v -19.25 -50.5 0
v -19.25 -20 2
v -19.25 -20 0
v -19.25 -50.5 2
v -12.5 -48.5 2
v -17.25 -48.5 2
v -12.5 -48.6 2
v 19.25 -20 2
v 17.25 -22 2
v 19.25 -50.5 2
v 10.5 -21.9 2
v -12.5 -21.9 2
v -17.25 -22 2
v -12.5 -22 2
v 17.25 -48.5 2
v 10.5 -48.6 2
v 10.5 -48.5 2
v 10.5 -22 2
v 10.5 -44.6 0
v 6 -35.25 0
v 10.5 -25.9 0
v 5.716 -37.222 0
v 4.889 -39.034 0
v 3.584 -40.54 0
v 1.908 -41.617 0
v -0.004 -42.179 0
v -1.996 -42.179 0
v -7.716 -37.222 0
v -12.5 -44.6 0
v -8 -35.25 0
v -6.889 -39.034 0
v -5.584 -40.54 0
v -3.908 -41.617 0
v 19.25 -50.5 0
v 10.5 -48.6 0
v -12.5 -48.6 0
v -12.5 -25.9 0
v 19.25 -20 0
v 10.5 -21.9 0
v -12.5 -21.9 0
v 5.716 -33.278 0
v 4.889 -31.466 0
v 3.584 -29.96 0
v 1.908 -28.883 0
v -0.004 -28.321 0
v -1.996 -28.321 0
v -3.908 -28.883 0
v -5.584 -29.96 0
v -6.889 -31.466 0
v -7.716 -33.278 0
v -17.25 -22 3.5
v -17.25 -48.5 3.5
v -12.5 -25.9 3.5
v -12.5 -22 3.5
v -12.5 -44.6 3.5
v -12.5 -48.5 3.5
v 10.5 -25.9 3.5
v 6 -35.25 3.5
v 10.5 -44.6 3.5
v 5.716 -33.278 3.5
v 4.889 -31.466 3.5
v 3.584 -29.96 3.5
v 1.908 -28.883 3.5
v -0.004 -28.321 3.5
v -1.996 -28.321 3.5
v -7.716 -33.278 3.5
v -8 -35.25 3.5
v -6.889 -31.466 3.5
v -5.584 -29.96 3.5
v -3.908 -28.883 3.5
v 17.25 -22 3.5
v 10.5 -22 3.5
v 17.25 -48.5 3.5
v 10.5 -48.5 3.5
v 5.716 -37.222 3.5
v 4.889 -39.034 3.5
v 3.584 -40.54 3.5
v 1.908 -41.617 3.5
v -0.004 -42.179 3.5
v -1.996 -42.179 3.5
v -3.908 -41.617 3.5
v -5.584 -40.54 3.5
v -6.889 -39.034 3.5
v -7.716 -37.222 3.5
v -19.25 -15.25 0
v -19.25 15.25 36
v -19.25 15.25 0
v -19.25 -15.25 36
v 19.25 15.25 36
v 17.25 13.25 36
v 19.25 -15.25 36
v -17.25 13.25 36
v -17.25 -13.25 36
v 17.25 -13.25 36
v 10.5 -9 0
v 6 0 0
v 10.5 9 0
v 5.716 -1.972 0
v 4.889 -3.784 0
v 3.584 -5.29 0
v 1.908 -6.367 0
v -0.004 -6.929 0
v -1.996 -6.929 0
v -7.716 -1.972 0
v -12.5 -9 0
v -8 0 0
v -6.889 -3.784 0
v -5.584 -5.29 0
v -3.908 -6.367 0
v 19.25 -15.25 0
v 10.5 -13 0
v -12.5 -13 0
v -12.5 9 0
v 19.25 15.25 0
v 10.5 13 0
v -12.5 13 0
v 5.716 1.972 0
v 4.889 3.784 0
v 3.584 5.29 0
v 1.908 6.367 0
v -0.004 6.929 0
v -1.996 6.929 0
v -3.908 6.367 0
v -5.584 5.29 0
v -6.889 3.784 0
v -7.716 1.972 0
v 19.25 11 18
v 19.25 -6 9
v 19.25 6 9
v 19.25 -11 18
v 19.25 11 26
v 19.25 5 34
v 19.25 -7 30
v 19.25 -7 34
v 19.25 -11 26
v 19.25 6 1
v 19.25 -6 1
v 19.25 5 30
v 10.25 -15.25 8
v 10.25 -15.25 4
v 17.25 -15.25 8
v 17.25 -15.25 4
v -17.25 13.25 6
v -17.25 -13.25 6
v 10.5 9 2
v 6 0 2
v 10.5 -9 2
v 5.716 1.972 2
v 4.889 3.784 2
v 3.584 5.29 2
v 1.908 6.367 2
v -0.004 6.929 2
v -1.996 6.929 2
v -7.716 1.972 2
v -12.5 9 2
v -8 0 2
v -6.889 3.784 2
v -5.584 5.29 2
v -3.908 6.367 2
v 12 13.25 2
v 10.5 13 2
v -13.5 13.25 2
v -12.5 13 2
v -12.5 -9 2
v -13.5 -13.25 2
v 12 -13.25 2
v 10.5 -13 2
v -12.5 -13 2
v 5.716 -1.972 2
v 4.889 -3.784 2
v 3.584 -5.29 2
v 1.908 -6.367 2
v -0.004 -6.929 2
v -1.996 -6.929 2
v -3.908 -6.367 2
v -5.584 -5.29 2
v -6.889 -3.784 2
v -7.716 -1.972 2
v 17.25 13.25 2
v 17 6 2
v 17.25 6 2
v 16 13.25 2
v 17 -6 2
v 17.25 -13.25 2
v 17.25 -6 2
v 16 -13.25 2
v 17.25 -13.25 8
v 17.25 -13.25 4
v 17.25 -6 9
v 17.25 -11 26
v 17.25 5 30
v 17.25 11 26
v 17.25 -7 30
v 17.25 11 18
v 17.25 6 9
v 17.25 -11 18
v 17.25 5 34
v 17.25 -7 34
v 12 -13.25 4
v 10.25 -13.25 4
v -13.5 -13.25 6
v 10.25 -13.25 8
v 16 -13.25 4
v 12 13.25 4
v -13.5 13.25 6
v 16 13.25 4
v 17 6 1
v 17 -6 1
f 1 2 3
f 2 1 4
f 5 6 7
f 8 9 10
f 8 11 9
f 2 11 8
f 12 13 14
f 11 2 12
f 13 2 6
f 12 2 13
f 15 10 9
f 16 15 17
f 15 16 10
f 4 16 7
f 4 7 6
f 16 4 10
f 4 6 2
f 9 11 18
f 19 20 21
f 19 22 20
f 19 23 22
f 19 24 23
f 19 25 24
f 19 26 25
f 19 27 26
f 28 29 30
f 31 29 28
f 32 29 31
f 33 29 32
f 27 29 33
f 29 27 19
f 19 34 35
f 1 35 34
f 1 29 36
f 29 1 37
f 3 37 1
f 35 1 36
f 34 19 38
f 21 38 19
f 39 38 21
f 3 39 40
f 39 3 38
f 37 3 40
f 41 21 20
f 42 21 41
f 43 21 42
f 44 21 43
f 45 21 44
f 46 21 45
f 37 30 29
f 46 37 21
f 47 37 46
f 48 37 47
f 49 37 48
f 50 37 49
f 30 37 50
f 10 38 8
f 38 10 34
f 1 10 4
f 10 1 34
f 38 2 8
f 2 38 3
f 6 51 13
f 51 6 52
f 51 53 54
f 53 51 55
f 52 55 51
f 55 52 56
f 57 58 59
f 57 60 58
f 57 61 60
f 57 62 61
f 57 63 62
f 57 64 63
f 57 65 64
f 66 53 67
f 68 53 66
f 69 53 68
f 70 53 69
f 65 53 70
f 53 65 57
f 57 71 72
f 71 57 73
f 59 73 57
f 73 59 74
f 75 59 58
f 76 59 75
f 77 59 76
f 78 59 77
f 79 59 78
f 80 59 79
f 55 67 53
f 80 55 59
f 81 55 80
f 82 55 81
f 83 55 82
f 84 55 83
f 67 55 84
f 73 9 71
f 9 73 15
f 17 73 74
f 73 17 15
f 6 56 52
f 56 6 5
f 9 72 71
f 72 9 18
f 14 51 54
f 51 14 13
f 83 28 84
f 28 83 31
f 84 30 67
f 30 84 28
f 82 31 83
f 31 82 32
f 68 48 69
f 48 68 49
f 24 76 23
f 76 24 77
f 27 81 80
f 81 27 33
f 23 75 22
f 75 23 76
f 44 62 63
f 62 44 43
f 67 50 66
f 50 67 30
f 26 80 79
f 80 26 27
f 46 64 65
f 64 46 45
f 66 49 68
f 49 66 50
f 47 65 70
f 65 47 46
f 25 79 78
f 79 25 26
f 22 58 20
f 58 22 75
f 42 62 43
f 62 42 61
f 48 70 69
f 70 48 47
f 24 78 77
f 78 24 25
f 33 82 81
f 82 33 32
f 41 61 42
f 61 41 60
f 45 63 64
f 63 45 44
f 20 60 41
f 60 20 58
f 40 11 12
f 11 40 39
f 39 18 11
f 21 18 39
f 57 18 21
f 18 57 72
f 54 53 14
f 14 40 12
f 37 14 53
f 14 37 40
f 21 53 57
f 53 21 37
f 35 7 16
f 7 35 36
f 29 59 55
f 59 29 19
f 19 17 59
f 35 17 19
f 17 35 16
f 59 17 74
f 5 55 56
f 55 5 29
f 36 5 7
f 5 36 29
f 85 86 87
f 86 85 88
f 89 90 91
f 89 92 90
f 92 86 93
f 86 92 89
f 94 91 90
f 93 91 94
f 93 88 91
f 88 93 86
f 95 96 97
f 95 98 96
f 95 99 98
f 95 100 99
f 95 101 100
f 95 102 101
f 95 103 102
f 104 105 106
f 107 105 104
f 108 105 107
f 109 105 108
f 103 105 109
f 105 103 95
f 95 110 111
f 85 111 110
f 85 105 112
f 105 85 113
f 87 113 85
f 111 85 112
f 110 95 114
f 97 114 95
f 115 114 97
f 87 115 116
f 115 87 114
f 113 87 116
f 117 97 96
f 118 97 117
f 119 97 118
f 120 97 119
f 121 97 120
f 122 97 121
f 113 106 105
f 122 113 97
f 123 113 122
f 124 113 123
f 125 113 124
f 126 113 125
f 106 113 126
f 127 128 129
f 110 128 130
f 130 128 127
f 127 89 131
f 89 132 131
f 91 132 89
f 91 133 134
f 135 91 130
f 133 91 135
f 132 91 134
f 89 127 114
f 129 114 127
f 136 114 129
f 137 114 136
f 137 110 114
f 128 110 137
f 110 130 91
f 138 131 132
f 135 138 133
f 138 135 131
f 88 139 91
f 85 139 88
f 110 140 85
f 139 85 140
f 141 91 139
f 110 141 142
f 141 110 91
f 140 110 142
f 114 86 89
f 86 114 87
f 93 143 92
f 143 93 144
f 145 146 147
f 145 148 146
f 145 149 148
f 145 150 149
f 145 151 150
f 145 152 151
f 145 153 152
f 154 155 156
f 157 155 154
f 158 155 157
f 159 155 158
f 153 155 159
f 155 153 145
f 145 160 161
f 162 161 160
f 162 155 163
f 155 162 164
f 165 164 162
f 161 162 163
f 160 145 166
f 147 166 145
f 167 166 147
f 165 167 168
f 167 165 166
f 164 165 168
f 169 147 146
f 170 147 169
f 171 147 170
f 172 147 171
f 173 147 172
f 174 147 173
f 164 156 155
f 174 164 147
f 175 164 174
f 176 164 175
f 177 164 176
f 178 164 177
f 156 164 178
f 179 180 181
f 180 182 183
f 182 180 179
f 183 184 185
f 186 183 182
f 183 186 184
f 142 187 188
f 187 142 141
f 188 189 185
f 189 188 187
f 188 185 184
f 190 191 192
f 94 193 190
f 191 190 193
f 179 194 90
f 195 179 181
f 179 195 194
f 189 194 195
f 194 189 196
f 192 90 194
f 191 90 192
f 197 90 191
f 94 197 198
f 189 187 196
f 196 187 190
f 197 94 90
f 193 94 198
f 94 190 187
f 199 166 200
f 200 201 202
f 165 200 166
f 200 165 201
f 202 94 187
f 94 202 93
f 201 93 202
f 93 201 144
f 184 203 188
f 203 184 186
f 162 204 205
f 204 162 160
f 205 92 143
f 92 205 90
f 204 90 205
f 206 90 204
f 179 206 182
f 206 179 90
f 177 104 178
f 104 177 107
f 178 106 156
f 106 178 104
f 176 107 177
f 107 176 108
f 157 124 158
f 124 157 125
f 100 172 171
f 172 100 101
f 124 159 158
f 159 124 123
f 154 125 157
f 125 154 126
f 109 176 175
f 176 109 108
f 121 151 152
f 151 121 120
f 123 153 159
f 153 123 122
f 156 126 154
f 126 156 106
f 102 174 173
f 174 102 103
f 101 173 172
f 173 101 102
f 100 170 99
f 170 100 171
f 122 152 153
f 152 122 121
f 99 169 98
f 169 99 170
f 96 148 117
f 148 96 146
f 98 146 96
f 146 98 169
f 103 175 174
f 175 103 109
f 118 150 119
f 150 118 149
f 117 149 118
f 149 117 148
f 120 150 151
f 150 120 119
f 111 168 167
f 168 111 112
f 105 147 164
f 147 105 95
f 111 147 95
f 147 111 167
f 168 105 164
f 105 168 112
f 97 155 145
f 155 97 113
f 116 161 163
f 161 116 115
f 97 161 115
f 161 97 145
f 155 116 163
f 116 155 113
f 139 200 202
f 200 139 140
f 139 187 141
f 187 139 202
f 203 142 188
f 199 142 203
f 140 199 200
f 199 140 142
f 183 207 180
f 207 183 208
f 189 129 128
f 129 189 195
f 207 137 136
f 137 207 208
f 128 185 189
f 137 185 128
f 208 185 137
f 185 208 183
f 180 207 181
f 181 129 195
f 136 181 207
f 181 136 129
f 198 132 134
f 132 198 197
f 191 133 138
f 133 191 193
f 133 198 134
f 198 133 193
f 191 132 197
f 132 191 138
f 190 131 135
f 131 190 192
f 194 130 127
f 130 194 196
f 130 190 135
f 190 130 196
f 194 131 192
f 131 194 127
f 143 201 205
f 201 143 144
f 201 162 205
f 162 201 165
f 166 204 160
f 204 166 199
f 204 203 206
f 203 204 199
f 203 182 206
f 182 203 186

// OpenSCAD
//
// WeMOS D1 Mini Stack Enclosure Script
//
// I wrote this script to generate a suitable 3-d printed enclosure for a WeMOS "stack" of shields.
// Since there are a variety of connectors, sizes and arrangements, I decided to let the customizer
// allow for various positionings of each shields port.
//
// To use, you will need to assemble your device and measure the total height of the case, and the
// height offsets for any shields that require an opening in the case.
//
// For instance, I have a WeMOS D1 Mini with a battery shield and then an SD Card shield on top of 
// that.  All have stackable headers, that have had their pins trimmed to make the stack as short
// as possible.  The resulting measurements of the stack yield the default values of this script.
//

/* [Height] */

// Final height of the stack walls.
height = 36.0;

/* [Shield Ports] */

// Distance from the bottom to the bottom of the usb connector opening (0.0 to omit)
usb_height = 1.0;
// Distance from the bottom to the bottom of the microsd shield opening (0.0 to omit)
microsd_height = 30;
// Distance from the bottom to the bottom of the battery shield connector opening (0.0 to omit)
battery_height = 18.0;
// Distance from the bottom to the bottom of the relay shield connector terminal opening (0.0 to omit)
relay_height = 0.0;

// ---------------------------------------------------------------------------------------------------------
// do not need to modify anything below here
// ---------------------------------------------------------------------------------------------------------
/* [Hidden] */

thickness = 2.0;
fudge = 0.1;

width = 38.5;
depth = 30.50;
 
cavity_width = width - (2 * thickness);
cavity_depth = depth - (2 * thickness);
cavity_height = height - thickness + fudge;

hole_diameter = 7.0;

slit_width = 4.0;
slit_height = 23.0;

// lid
rotate([0, 0, 180])
difference() {
    union () {
        translate([-(width / 2.0), 20, 0.0]) cube([width, depth, 2.0]);
        translate([-(cavity_width / 2.0), 22, 2.0]) cube([cavity_width, cavity_depth, 1.5]);            
    }
    translate([1, 22 + (cavity_depth / 2), 2.5]) cylinder(h = 5 + fudge, r1 = hole_diameter, r2 =hole_diameter, center = true);
    rotate([0, 0, 90]) translate([21.9, -12.5, 0]) cube([slit_width, slit_height, 10]);
    rotate([0, 0, 90]) translate([44.6, -12.5, 0]) cube([slit_width, slit_height, 10]);
}

// base
rotate([0, 0, 180])
union() {
    translate([13.5, -(cavity_depth / 2.0), 2]) cube([4.0, cavity_depth, 4.0]);
    translate([-16, -(cavity_depth / 2.0), 2]) cube([4.0, cavity_depth, 2.0]);
    difference () {
        translate([0, 0, height / 2.0]) cube([width, depth, height], center = true); 
        translate([0, 0, (cavity_height / 2.0) + thickness]) cube([cavity_width, cavity_depth, cavity_height], center = true);
        translate([1, 0, thickness / 2.0]) cylinder(h = thickness + fudge, r1 = hole_diameter, r2 = hole_diameter, center = true);
        rotate([0, 0, 90]) translate([9, -12.5, 0]) cube([slit_width, slit_height, 5]);
        rotate([0, 0, 90]) translate([-13, -12.5, 0]) cube([slit_width, slit_height, 5]);
        translate([-17.25, 13.0, 4]) cube([7, 3, 4]);        
        if (usb_height > 0.0)
        {
            translate([-20, -6, 1]) cube([3, 12, 8]);
        }
        if (microsd_height > 0.0)
        {
            translate([-20, -5, microsd_height]) cube([3, 12, 4]);
        }
        if (battery_height > 0.0)
        {
            translate([-20, -11, battery_height]) cube([3, 22, 8]);
        }
        if (relay_height > 0.0)
        {
            translate([-20, -6, relay_height]) cube([3, 15, 7]);
        }
    }
}

